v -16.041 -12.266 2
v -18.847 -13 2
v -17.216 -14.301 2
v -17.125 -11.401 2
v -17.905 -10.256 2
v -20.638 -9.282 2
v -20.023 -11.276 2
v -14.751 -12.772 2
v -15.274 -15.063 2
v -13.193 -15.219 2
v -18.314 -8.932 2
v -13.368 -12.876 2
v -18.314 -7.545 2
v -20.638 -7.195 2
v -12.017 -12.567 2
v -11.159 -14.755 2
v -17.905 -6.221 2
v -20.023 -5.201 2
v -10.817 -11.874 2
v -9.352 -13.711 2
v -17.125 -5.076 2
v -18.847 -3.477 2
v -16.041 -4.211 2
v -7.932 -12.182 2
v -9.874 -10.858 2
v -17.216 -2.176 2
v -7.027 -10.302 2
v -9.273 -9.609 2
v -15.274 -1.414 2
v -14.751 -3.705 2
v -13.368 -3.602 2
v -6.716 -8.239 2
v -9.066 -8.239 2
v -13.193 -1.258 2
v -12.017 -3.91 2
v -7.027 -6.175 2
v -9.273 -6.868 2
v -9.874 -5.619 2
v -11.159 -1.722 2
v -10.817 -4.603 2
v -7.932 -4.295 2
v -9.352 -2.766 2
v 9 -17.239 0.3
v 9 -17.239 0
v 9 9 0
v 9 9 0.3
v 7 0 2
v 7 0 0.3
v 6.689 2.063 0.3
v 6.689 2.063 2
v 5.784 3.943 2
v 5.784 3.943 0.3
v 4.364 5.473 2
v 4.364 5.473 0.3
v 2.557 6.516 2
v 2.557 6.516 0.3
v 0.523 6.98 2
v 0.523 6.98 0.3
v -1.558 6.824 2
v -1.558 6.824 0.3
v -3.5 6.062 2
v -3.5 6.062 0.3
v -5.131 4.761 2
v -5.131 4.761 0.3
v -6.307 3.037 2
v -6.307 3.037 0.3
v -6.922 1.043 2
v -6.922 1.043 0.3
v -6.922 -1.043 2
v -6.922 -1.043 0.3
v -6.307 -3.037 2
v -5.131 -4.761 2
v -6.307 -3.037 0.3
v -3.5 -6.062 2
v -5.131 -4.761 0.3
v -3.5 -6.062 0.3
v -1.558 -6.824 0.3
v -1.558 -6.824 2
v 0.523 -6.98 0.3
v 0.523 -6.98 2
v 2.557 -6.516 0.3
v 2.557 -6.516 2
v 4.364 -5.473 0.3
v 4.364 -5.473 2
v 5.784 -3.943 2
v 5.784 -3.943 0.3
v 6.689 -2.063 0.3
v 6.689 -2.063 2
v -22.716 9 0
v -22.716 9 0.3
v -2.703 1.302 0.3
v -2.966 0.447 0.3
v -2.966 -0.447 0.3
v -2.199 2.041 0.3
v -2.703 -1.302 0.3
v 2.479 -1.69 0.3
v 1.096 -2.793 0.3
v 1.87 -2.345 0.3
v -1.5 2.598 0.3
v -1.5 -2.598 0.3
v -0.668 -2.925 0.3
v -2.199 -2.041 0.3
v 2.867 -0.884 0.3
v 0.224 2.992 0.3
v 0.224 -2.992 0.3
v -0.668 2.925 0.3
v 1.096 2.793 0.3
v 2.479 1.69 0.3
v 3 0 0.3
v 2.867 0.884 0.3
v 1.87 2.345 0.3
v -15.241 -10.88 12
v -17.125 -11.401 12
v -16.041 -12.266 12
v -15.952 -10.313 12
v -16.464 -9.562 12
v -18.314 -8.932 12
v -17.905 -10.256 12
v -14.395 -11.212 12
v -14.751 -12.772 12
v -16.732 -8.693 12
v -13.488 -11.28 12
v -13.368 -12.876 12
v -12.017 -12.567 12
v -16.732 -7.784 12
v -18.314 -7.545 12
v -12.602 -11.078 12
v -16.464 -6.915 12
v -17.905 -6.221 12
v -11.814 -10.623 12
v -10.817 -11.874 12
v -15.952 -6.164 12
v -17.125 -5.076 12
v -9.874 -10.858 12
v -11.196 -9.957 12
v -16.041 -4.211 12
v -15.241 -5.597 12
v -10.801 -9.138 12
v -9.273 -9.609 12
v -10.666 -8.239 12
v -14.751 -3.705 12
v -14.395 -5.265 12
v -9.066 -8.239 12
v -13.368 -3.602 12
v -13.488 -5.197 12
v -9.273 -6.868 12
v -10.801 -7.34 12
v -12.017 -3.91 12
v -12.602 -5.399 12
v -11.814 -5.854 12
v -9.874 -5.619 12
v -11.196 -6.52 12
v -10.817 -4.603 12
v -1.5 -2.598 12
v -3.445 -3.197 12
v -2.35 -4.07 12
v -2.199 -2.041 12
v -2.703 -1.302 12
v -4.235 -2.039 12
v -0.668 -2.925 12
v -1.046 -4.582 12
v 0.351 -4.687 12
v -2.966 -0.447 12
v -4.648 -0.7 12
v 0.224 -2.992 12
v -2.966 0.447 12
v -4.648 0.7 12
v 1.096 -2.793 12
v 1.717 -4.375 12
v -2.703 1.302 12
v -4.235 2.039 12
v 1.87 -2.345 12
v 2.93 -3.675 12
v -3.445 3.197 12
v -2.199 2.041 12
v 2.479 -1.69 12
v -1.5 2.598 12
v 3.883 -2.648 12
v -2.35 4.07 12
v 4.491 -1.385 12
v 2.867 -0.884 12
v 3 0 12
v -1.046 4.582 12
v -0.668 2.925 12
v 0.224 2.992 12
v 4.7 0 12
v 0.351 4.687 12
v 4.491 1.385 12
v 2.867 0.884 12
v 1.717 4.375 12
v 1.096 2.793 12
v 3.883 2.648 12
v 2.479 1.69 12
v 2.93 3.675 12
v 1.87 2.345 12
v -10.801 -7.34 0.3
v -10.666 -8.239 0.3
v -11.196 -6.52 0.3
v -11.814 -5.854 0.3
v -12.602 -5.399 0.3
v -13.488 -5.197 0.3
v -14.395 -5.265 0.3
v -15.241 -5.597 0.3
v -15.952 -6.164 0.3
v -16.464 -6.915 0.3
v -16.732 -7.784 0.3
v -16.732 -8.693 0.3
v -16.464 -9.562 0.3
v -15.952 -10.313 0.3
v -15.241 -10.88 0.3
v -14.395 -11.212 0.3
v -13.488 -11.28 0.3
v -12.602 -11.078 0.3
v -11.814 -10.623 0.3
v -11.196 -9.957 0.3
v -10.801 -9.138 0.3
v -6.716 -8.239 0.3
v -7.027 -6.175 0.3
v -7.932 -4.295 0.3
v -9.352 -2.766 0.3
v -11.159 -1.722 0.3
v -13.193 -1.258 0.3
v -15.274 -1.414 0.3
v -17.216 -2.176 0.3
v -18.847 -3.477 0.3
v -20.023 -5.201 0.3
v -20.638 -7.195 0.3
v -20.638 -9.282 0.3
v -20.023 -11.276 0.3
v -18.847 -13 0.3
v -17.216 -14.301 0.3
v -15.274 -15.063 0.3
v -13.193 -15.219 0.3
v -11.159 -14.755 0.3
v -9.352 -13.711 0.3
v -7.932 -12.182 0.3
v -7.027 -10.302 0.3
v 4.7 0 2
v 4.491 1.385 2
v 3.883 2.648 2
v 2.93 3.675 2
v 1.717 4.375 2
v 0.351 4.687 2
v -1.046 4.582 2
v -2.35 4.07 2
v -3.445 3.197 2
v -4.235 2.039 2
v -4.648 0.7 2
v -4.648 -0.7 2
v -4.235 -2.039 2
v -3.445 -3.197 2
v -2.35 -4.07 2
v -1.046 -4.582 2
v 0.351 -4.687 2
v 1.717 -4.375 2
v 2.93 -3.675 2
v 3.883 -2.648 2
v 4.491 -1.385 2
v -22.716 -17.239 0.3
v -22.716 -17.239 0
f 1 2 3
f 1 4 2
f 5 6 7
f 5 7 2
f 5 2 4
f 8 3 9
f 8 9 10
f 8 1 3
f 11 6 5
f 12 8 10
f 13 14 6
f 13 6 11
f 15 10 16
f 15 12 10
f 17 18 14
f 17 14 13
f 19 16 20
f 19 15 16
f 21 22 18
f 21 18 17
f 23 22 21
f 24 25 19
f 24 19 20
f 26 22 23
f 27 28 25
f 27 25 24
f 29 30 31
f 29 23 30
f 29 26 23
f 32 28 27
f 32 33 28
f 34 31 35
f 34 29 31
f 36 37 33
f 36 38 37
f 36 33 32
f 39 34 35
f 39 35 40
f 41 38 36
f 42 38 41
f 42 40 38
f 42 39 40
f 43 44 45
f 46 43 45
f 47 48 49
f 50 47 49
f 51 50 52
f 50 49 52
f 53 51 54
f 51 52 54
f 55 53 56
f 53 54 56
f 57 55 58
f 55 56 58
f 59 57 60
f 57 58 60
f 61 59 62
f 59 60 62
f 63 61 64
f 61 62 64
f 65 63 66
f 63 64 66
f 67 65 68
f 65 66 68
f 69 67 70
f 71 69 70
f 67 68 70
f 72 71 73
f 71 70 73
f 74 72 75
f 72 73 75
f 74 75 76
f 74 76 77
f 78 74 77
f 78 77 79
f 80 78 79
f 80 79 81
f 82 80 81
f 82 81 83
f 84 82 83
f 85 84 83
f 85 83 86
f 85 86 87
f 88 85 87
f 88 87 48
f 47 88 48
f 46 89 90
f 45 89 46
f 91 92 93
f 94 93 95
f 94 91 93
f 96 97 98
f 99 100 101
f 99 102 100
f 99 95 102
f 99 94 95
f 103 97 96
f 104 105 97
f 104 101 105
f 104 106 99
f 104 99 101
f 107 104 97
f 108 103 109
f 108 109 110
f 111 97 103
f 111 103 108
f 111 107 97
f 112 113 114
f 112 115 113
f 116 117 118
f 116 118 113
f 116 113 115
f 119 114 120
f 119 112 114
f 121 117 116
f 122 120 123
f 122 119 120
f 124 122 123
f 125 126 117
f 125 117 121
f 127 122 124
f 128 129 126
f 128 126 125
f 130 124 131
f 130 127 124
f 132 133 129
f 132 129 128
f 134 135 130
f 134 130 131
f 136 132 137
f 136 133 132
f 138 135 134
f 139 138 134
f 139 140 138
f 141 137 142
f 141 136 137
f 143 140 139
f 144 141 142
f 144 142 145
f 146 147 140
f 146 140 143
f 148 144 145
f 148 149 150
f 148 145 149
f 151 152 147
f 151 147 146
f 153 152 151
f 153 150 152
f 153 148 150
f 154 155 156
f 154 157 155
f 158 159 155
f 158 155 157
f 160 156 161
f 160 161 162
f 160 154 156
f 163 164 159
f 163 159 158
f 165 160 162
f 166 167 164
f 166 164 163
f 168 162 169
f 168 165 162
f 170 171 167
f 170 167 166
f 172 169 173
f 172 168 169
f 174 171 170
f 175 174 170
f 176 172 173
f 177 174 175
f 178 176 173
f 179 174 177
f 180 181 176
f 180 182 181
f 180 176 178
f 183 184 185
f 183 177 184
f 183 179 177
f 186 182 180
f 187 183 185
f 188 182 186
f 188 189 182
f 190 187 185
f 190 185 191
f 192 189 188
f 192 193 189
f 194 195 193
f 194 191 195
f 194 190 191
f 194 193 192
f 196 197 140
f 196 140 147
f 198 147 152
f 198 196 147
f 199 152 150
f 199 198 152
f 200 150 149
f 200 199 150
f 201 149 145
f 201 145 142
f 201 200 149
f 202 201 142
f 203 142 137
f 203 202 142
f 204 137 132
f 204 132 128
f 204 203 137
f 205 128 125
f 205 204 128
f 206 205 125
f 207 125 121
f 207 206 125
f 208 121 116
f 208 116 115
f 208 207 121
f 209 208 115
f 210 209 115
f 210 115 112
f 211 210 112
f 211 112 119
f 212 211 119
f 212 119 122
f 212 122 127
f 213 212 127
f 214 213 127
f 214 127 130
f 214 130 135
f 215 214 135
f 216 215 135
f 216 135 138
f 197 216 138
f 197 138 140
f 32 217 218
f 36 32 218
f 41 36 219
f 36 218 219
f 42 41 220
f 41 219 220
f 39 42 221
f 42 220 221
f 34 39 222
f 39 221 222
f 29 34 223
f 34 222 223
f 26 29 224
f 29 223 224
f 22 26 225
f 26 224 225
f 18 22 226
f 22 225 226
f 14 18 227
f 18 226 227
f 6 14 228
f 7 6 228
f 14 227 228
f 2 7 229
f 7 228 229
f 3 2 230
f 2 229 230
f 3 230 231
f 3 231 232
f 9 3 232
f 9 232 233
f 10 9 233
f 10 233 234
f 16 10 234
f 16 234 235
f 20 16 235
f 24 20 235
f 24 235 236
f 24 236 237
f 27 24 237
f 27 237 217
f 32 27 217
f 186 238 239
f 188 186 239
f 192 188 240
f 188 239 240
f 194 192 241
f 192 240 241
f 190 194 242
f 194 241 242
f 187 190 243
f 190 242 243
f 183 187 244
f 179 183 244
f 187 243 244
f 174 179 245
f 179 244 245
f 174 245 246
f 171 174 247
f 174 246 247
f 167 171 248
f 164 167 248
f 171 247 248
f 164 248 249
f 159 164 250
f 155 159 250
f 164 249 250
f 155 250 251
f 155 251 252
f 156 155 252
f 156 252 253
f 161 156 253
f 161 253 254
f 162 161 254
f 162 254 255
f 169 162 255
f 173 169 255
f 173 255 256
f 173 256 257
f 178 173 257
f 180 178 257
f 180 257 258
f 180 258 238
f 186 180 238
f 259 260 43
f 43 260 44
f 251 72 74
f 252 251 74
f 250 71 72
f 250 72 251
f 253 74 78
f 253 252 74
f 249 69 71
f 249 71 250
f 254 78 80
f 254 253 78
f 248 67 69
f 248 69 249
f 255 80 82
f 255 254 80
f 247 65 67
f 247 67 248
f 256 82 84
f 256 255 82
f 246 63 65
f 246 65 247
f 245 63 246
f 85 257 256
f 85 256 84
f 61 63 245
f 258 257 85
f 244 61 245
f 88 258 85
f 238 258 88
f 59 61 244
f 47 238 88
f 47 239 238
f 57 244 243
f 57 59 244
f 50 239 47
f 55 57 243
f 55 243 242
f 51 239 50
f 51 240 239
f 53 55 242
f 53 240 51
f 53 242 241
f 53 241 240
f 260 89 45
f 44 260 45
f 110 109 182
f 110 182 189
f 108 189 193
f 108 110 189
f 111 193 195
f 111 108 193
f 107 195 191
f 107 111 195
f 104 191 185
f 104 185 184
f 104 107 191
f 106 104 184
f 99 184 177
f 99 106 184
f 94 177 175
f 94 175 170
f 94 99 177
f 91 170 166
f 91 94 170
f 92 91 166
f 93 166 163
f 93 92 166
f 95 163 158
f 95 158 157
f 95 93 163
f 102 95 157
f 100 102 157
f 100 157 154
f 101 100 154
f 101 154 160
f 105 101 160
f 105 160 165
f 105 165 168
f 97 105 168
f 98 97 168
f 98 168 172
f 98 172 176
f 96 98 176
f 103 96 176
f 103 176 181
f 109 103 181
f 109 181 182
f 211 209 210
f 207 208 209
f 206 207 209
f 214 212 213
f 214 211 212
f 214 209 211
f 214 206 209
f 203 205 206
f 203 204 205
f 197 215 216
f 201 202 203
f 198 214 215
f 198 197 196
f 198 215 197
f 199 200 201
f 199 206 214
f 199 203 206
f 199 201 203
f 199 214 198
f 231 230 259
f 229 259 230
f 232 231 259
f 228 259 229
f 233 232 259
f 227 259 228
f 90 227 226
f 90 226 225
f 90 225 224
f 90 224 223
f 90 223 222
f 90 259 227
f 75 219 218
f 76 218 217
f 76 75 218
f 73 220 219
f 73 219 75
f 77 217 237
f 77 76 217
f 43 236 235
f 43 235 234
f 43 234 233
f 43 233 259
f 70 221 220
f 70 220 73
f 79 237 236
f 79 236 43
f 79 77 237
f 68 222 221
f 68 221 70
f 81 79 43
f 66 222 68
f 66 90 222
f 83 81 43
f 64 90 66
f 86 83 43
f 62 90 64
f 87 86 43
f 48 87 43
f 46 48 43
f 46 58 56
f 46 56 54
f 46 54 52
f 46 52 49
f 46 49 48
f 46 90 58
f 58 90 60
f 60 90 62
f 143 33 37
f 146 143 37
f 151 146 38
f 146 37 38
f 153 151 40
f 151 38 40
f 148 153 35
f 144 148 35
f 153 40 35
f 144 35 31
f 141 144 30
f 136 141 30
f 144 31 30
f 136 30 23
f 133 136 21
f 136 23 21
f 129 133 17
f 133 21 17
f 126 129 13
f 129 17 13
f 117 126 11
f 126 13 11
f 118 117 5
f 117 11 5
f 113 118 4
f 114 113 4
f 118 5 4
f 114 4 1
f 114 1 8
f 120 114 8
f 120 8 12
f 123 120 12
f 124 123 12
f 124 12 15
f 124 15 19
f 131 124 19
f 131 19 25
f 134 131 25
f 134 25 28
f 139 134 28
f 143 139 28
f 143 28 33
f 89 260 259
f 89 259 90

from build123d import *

# Parameters (mm, degrees)
F0_R     = 7
F0_R_2   = 4.7
F0_R_3   = 3
F1_DEPTH = 2
F2_DEPTH = 12
F0_R_4   = 4.65
F3_DEPTH = 2
F0_R_5   = 3.05
F4_DEPTH = 12
F0_W     = 31.71593739
F0_H     = 26.2385108796
F5_DEPTH = 0.3


with BuildPart() as f1:
    # F0 (on Top) → F1 (new body)
    with BuildSketch(Plane.XY):
        Circle(F0_R)
        Circle(F0_R_2, mode=Mode.SUBTRACT)
        Circle(F0_R_2)
        Circle(F0_R_3, mode=Mode.SUBTRACT)
    extrude(amount=F1_DEPTH)

    # F0 (on Top) → F2 (join)
    with BuildSketch(Plane.XY):
        Circle(F0_R_2)
        Circle(F0_R_3, mode=Mode.SUBTRACT)
    extrude(amount=F2_DEPTH)



with BuildPart() as f3:
    # F0 (on Top) → F3 (new body)
    with BuildSketch(Plane.XY):
        with Locations((-13.71593739, -8.2385108796)):
            Circle(F0_R)
        with Locations((-13.71593739, -8.2385108796)):
            Circle(F0_R_4, mode=Mode.SUBTRACT)
    extrude(amount=F3_DEPTH)

    # F0 (on Top) → F4 (join)
    with BuildSketch(Plane.XY):
        with Locations((-13.71593739, -8.2385108796)):
            Circle(F0_R_4)
        with Locations((-13.71593739, -8.2385108796)):
            Circle(F0_R_5, mode=Mode.SUBTRACT)
    extrude(amount=F4_DEPTH)


with BuildPart() as f1_1:
    add(f1.part)

    add(f3.part)  # F5 merges F3
    # F0 (on Top) → F5 (join)
    with BuildSketch(Plane.XY):
        with Locations((-6.857968695, -4.1192554398)):
            Rectangle(F0_W, F0_H)
        with Locations((-13.71593739, -8.2385108796)):
            Circle(F0_R, mode=Mode.SUBTRACT)
        Circle(F0_R, mode=Mode.SUBTRACT)
        with Locations((-13.71593739, -8.2385108796)):
            Circle(F0_R)
        with Locations((-13.71593739, -8.2385108796)):
            Circle(F0_R_4, mode=Mode.SUBTRACT)
        Circle(F0_R)
        Circle(F0_R_2, mode=Mode.SUBTRACT)
        Circle(F0_R_2)
        Circle(F0_R_3, mode=Mode.SUBTRACT)
        with Locations((-13.71593739, -8.2385108796)):
            Circle(F0_R_4)
        with Locations((-13.71593739, -8.2385108796)):
            Circle(F0_R_5, mode=Mode.SUBTRACT)
        with Locations((-13.71593739, -8.2385108796)):
            Circle(F0_R_5)
        Circle(F0_R_3)
    extrude(amount=F5_DEPTH)


solid = f1_1.part
